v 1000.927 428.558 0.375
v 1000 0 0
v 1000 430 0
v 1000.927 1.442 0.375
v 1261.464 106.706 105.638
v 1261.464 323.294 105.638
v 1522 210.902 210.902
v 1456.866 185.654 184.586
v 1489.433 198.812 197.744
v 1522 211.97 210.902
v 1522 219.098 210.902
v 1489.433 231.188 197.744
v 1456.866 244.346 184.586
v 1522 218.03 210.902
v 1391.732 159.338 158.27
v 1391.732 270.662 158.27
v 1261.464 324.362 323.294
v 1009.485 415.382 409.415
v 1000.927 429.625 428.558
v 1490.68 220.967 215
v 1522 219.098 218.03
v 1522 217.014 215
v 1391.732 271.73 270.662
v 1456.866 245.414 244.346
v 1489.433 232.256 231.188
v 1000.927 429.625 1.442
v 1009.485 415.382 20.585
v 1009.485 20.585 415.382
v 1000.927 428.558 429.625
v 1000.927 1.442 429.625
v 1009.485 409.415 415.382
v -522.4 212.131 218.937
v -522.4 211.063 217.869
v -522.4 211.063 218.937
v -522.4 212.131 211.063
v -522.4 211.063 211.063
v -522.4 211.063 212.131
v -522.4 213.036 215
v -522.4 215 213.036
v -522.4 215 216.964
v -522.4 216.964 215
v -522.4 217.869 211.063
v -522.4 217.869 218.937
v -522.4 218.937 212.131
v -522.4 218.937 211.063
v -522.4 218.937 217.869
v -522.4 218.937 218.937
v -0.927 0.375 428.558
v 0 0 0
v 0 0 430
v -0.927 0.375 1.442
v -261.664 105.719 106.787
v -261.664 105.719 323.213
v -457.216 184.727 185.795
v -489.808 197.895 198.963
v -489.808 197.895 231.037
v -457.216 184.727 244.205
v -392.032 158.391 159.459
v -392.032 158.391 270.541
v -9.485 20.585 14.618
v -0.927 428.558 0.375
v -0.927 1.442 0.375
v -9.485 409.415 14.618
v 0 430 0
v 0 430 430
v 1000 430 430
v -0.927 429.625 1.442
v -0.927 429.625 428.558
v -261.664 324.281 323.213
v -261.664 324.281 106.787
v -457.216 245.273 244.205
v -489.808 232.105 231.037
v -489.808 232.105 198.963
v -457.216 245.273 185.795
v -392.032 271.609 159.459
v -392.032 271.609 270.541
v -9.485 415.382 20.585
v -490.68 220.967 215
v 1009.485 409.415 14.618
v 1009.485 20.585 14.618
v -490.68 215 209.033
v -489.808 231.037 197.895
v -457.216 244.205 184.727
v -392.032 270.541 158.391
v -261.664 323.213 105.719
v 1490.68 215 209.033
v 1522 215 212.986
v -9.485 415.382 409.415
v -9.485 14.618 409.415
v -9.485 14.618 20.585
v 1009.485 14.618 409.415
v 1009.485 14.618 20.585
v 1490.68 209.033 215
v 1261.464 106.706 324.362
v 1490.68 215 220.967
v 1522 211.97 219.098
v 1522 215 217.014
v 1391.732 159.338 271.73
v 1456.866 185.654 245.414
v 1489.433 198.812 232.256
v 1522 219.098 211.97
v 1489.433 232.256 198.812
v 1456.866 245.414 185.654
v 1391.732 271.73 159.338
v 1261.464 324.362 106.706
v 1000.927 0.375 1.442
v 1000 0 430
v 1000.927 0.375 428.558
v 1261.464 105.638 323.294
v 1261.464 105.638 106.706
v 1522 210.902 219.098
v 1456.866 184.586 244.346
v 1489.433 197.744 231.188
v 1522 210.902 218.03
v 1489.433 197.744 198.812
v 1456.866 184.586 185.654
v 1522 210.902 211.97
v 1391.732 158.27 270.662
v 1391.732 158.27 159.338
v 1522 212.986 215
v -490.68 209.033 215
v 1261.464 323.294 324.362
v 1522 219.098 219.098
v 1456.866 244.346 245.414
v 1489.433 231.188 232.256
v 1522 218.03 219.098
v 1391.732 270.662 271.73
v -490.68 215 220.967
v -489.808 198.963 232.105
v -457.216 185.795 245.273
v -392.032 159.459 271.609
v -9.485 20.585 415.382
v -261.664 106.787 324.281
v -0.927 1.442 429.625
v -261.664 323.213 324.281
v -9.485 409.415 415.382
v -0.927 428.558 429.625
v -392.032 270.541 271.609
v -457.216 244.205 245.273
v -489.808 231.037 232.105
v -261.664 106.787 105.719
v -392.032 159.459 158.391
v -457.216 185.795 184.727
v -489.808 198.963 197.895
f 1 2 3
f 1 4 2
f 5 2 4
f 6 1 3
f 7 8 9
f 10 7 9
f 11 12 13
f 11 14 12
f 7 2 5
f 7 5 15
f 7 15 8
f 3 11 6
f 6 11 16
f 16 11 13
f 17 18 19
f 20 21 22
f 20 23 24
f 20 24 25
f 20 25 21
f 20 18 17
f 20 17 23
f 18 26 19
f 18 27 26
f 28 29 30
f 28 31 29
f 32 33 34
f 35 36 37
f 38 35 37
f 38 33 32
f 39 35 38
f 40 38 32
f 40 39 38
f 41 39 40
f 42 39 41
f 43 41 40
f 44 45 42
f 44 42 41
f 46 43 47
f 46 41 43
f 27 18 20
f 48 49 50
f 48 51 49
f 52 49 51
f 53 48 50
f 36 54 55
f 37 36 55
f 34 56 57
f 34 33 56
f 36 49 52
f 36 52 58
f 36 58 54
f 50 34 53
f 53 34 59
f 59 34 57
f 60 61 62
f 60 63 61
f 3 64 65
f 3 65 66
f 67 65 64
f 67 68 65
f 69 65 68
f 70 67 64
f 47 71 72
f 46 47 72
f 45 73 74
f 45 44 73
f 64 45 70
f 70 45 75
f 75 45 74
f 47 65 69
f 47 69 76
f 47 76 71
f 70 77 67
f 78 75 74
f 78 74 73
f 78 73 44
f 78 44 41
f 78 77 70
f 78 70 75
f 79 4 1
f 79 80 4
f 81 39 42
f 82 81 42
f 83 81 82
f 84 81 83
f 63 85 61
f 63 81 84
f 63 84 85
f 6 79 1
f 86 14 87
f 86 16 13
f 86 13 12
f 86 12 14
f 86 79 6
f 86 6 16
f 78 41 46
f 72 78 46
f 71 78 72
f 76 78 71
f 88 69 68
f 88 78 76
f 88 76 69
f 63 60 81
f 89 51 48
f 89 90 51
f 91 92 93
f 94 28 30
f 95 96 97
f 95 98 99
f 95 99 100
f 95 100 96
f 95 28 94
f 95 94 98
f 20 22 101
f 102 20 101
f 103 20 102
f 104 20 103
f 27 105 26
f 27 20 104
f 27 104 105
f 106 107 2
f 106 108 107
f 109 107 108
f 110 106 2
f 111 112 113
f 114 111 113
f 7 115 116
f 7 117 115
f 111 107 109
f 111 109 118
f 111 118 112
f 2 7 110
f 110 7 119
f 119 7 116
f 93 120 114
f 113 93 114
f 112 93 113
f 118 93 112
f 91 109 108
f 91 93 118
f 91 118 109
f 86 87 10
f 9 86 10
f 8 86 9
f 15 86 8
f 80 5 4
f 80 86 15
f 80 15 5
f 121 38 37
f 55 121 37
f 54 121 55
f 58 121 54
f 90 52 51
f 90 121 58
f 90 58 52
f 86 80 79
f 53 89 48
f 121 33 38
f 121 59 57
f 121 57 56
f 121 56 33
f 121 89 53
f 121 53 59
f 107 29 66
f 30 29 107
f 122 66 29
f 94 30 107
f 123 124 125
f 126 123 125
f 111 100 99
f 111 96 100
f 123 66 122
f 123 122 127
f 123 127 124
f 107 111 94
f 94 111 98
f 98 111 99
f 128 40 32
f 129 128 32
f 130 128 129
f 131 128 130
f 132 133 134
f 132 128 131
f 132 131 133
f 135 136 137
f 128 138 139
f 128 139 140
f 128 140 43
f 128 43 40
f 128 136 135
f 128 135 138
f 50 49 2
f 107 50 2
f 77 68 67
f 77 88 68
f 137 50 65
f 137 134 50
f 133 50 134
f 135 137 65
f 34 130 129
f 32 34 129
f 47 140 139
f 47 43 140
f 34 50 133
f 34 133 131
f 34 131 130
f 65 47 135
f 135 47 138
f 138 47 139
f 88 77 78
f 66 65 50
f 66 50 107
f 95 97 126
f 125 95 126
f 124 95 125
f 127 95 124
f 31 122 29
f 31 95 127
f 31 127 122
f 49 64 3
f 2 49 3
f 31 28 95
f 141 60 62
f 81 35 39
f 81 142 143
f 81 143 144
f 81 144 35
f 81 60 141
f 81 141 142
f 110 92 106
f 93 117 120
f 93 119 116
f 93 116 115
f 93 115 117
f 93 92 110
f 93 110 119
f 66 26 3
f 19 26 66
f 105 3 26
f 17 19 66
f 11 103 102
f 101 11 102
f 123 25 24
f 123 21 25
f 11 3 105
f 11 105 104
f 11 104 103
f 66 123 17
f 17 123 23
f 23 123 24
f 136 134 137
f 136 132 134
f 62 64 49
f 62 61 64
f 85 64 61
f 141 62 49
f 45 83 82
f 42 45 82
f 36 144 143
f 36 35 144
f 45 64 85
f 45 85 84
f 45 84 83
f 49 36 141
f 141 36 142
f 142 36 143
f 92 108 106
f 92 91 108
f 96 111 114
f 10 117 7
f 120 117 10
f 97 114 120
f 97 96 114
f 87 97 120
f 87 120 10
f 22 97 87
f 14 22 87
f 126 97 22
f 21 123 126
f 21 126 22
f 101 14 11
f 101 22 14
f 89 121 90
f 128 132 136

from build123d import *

# Parameters (mm, degrees)
ESQUISSE3_W              = 1000
ESQUISSE3_H              = 430
BOSS_EXTRU_2_DEPTH       = 430
ESQUISSE4_W              = 430
ESQUISSE4_H              = 430
BOSS_EXTRU_3_DEPTH       = 522.4
BOSS_EXTRU_3_TAPER       = 22
ESQUISSE5_W              = 430
ESQUISSE5_H              = 430
BOSS_EXTRU_4_DEPTH       = 522
BOSS_EXTRU_4_TAPER       = 22
ENL_V_MAT_EXTRU_1_DEPTH  = 10
ENL_V_MAT_EXTRU_1_TAPER  = 53
ENL_V_MAT_EXTRU_2_DEPTH  = 10
ENL_V_MAT_EXTRU_2_TAPER  = 53
ENL_V_MAT_EXTRU_3_DEPTH  = 10
ENL_V_MAT_EXTRU_3_TAPER  = 53
ENL_V_MAT_EXTRU_4_DEPTH  = 10
ENL_V_MAT_EXTRU_4_TAPER  = 53
ENL_V_MAT_EXTRU_7_DEPTH  = 10
ENL_V_MAT_EXTRU_7_TAPER  = 53
ENL_V_MAT_EXTRU_8_DEPTH  = 10
ENL_V_MAT_EXTRU_8_TAPER  = 53
ENL_V_MAT_EXTRU_9_DEPTH  = 10
ENL_V_MAT_EXTRU_9_TAPER  = 53
ENL_V_MAT_EXTRU_10_DEPTH = 10
ENL_V_MAT_EXTRU_10_TAPER = 53


with BuildPart() as part:
    # Esquisse3 → Boss.-Extru.2 (new body)
    with BuildSketch(Plane.XY):
        with Locations((500, 215)):
            Rectangle(ESQUISSE3_W, ESQUISSE3_H)
    extrude(amount=BOSS_EXTRU_2_DEPTH)

    # Esquisse4 → Boss.-Extru.3 (add)
    with BuildSketch(Plane.ZY):
        with Locations((215, 215)):
            Rectangle(ESQUISSE4_W, ESQUISSE4_H)
    extrude(amount=BOSS_EXTRU_3_DEPTH, taper=BOSS_EXTRU_3_TAPER)

    # Esquisse5 → Boss.-Extru.4 (add)
    with BuildSketch(Plane(origin=(1000, 0, 0), x_dir=(0, 0, -1), z_dir=(1, 0, 0))):
        with Locations((-215, 215)):
            Rectangle(ESQUISSE5_W, ESQUISSE5_H)
    extrude(amount=BOSS_EXTRU_4_DEPTH, taper=BOSS_EXTRU_4_TAPER)

    # Esquisse6 → Enlèv. mat.-Extru.1 (cut)
    with BuildSketch(Plane(origin=(-149.351549649, 0, 369.658057073), x_dir=(0.927183855, 0, 0.374606593), z_dir=(-0.374606593, 0, 0.927183855))):
        Polygon((160.080835169, 428.557531009), (-410.003981176, 215), (160.080835169, 1.442468991), align=None)
    extrude(amount=-ENL_V_MAT_EXTRU_1_DEPTH, taper=ENL_V_MAT_EXTRU_1_TAPER, mode=Mode.SUBTRACT)

    # Esquisse7 → Enlèv. mat.-Extru.2 (cut)
    with BuildSketch(Plane(origin=(-149.351549649, 369.658057073, 0), x_dir=(0.927183855, 0.374606593, 0), z_dir=(-0.374606593, 0.927183855, 0))):
        Polygon((160.080835169, -428.557531009), (160.080835169, -1.442468991), (-410.003981176, -215), align=None)
    extrude(amount=-ENL_V_MAT_EXTRU_2_DEPTH, taper=ENL_V_MAT_EXTRU_2_TAPER, mode=Mode.SUBTRACT)

    # Esquisse8 → Enlèv. mat.-Extru.3 (cut)
    with BuildSketch(Plane(origin=(0, 0, 0), x_dir=(-0.927183855, 0, 0.374606593), z_dir=(-0.374606593, 0, -0.927183855))):
        Polygon((1, 428.557531009), (1, 1.442468991), (571.084816345, 215), align=None)
    extrude(amount=-ENL_V_MAT_EXTRU_3_DEPTH, taper=ENL_V_MAT_EXTRU_3_TAPER, mode=Mode.SUBTRACT)

    # Esquisse9 → Enlèv. mat.-Extru.4 (cut)
    with BuildSketch(Plane(origin=(0, 0, 0), x_dir=(0.927183855, -0.374606593, 0), z_dir=(-0.374606593, -0.927183855, 0))):
        Polygon((-571.084816345, 215), (-1, 1.442468991), (-1, 428.557531009), align=None)
    extrude(amount=-ENL_V_MAT_EXTRU_4_DEPTH, taper=ENL_V_MAT_EXTRU_4_TAPER, mode=Mode.SUBTRACT)

    # Esquisse12 → Enlèv. mat.-Extru.7 (cut)
    with BuildSketch(Plane(origin=(140.330099831, -347.329185229, 0), x_dir=(-0.927183855, -0.374606593, 0), z_dir=(0.374606593, -0.927183855, 0))):
        Polygon((-928.183854567, -428.557531009), (-928.183854567, -1.442468991), (-1498.268670912, -215), align=None)
    extrude(amount=-ENL_V_MAT_EXTRU_7_DEPTH, taper=ENL_V_MAT_EXTRU_7_TAPER, mode=Mode.SUBTRACT)

    # Esquisse13 → Enlèv. mat.-Extru.8 (cut)
    with BuildSketch(Plane(origin=(289.681649479, 0, 716.987242302), x_dir=(0.927183855, 0, -0.374606593), z_dir=(0.374606593, 0, 0.927183855))):
        Polygon((767.103019398, 428.557531009), (767.103019398, 1.442468991), (1337.187835743, 215), align=None)
    extrude(amount=-ENL_V_MAT_EXTRU_8_DEPTH, taper=ENL_V_MAT_EXTRU_8_TAPER, mode=Mode.SUBTRACT)

    # Esquisse14 → Enlèv. mat.-Extru.9 (cut)
    with BuildSketch(Plane(origin=(289.681649479, 716.987242302, 0), x_dir=(0.927183855, -0.374606593, 0), z_dir=(0.374606593, 0.927183855, 0))):
        Polygon((767.103019398, -1.442468991), (767.103019398, -428.557531009), (1337.187835743, -215), align=None)
    extrude(amount=-ENL_V_MAT_EXTRU_9_DEPTH, taper=ENL_V_MAT_EXTRU_9_TAPER, mode=Mode.SUBTRACT)

    # Esquisse15 → Enlèv. mat.-Extru.10 (cut)
    with BuildSketch(Plane(origin=(140.330099831, 0, -347.329185229), x_dir=(-0.927183855, 0, -0.374606593), z_dir=(0.374606593, 0, -0.927183855))):
        Polygon((-928.183854567, 428.557531009), (-1498.268670912, 215), (-928.183854567, 1.442468991), align=None)
    extrude(amount=-ENL_V_MAT_EXTRU_10_DEPTH, taper=ENL_V_MAT_EXTRU_10_TAPER, mode=Mode.SUBTRACT)


solid = part.part
